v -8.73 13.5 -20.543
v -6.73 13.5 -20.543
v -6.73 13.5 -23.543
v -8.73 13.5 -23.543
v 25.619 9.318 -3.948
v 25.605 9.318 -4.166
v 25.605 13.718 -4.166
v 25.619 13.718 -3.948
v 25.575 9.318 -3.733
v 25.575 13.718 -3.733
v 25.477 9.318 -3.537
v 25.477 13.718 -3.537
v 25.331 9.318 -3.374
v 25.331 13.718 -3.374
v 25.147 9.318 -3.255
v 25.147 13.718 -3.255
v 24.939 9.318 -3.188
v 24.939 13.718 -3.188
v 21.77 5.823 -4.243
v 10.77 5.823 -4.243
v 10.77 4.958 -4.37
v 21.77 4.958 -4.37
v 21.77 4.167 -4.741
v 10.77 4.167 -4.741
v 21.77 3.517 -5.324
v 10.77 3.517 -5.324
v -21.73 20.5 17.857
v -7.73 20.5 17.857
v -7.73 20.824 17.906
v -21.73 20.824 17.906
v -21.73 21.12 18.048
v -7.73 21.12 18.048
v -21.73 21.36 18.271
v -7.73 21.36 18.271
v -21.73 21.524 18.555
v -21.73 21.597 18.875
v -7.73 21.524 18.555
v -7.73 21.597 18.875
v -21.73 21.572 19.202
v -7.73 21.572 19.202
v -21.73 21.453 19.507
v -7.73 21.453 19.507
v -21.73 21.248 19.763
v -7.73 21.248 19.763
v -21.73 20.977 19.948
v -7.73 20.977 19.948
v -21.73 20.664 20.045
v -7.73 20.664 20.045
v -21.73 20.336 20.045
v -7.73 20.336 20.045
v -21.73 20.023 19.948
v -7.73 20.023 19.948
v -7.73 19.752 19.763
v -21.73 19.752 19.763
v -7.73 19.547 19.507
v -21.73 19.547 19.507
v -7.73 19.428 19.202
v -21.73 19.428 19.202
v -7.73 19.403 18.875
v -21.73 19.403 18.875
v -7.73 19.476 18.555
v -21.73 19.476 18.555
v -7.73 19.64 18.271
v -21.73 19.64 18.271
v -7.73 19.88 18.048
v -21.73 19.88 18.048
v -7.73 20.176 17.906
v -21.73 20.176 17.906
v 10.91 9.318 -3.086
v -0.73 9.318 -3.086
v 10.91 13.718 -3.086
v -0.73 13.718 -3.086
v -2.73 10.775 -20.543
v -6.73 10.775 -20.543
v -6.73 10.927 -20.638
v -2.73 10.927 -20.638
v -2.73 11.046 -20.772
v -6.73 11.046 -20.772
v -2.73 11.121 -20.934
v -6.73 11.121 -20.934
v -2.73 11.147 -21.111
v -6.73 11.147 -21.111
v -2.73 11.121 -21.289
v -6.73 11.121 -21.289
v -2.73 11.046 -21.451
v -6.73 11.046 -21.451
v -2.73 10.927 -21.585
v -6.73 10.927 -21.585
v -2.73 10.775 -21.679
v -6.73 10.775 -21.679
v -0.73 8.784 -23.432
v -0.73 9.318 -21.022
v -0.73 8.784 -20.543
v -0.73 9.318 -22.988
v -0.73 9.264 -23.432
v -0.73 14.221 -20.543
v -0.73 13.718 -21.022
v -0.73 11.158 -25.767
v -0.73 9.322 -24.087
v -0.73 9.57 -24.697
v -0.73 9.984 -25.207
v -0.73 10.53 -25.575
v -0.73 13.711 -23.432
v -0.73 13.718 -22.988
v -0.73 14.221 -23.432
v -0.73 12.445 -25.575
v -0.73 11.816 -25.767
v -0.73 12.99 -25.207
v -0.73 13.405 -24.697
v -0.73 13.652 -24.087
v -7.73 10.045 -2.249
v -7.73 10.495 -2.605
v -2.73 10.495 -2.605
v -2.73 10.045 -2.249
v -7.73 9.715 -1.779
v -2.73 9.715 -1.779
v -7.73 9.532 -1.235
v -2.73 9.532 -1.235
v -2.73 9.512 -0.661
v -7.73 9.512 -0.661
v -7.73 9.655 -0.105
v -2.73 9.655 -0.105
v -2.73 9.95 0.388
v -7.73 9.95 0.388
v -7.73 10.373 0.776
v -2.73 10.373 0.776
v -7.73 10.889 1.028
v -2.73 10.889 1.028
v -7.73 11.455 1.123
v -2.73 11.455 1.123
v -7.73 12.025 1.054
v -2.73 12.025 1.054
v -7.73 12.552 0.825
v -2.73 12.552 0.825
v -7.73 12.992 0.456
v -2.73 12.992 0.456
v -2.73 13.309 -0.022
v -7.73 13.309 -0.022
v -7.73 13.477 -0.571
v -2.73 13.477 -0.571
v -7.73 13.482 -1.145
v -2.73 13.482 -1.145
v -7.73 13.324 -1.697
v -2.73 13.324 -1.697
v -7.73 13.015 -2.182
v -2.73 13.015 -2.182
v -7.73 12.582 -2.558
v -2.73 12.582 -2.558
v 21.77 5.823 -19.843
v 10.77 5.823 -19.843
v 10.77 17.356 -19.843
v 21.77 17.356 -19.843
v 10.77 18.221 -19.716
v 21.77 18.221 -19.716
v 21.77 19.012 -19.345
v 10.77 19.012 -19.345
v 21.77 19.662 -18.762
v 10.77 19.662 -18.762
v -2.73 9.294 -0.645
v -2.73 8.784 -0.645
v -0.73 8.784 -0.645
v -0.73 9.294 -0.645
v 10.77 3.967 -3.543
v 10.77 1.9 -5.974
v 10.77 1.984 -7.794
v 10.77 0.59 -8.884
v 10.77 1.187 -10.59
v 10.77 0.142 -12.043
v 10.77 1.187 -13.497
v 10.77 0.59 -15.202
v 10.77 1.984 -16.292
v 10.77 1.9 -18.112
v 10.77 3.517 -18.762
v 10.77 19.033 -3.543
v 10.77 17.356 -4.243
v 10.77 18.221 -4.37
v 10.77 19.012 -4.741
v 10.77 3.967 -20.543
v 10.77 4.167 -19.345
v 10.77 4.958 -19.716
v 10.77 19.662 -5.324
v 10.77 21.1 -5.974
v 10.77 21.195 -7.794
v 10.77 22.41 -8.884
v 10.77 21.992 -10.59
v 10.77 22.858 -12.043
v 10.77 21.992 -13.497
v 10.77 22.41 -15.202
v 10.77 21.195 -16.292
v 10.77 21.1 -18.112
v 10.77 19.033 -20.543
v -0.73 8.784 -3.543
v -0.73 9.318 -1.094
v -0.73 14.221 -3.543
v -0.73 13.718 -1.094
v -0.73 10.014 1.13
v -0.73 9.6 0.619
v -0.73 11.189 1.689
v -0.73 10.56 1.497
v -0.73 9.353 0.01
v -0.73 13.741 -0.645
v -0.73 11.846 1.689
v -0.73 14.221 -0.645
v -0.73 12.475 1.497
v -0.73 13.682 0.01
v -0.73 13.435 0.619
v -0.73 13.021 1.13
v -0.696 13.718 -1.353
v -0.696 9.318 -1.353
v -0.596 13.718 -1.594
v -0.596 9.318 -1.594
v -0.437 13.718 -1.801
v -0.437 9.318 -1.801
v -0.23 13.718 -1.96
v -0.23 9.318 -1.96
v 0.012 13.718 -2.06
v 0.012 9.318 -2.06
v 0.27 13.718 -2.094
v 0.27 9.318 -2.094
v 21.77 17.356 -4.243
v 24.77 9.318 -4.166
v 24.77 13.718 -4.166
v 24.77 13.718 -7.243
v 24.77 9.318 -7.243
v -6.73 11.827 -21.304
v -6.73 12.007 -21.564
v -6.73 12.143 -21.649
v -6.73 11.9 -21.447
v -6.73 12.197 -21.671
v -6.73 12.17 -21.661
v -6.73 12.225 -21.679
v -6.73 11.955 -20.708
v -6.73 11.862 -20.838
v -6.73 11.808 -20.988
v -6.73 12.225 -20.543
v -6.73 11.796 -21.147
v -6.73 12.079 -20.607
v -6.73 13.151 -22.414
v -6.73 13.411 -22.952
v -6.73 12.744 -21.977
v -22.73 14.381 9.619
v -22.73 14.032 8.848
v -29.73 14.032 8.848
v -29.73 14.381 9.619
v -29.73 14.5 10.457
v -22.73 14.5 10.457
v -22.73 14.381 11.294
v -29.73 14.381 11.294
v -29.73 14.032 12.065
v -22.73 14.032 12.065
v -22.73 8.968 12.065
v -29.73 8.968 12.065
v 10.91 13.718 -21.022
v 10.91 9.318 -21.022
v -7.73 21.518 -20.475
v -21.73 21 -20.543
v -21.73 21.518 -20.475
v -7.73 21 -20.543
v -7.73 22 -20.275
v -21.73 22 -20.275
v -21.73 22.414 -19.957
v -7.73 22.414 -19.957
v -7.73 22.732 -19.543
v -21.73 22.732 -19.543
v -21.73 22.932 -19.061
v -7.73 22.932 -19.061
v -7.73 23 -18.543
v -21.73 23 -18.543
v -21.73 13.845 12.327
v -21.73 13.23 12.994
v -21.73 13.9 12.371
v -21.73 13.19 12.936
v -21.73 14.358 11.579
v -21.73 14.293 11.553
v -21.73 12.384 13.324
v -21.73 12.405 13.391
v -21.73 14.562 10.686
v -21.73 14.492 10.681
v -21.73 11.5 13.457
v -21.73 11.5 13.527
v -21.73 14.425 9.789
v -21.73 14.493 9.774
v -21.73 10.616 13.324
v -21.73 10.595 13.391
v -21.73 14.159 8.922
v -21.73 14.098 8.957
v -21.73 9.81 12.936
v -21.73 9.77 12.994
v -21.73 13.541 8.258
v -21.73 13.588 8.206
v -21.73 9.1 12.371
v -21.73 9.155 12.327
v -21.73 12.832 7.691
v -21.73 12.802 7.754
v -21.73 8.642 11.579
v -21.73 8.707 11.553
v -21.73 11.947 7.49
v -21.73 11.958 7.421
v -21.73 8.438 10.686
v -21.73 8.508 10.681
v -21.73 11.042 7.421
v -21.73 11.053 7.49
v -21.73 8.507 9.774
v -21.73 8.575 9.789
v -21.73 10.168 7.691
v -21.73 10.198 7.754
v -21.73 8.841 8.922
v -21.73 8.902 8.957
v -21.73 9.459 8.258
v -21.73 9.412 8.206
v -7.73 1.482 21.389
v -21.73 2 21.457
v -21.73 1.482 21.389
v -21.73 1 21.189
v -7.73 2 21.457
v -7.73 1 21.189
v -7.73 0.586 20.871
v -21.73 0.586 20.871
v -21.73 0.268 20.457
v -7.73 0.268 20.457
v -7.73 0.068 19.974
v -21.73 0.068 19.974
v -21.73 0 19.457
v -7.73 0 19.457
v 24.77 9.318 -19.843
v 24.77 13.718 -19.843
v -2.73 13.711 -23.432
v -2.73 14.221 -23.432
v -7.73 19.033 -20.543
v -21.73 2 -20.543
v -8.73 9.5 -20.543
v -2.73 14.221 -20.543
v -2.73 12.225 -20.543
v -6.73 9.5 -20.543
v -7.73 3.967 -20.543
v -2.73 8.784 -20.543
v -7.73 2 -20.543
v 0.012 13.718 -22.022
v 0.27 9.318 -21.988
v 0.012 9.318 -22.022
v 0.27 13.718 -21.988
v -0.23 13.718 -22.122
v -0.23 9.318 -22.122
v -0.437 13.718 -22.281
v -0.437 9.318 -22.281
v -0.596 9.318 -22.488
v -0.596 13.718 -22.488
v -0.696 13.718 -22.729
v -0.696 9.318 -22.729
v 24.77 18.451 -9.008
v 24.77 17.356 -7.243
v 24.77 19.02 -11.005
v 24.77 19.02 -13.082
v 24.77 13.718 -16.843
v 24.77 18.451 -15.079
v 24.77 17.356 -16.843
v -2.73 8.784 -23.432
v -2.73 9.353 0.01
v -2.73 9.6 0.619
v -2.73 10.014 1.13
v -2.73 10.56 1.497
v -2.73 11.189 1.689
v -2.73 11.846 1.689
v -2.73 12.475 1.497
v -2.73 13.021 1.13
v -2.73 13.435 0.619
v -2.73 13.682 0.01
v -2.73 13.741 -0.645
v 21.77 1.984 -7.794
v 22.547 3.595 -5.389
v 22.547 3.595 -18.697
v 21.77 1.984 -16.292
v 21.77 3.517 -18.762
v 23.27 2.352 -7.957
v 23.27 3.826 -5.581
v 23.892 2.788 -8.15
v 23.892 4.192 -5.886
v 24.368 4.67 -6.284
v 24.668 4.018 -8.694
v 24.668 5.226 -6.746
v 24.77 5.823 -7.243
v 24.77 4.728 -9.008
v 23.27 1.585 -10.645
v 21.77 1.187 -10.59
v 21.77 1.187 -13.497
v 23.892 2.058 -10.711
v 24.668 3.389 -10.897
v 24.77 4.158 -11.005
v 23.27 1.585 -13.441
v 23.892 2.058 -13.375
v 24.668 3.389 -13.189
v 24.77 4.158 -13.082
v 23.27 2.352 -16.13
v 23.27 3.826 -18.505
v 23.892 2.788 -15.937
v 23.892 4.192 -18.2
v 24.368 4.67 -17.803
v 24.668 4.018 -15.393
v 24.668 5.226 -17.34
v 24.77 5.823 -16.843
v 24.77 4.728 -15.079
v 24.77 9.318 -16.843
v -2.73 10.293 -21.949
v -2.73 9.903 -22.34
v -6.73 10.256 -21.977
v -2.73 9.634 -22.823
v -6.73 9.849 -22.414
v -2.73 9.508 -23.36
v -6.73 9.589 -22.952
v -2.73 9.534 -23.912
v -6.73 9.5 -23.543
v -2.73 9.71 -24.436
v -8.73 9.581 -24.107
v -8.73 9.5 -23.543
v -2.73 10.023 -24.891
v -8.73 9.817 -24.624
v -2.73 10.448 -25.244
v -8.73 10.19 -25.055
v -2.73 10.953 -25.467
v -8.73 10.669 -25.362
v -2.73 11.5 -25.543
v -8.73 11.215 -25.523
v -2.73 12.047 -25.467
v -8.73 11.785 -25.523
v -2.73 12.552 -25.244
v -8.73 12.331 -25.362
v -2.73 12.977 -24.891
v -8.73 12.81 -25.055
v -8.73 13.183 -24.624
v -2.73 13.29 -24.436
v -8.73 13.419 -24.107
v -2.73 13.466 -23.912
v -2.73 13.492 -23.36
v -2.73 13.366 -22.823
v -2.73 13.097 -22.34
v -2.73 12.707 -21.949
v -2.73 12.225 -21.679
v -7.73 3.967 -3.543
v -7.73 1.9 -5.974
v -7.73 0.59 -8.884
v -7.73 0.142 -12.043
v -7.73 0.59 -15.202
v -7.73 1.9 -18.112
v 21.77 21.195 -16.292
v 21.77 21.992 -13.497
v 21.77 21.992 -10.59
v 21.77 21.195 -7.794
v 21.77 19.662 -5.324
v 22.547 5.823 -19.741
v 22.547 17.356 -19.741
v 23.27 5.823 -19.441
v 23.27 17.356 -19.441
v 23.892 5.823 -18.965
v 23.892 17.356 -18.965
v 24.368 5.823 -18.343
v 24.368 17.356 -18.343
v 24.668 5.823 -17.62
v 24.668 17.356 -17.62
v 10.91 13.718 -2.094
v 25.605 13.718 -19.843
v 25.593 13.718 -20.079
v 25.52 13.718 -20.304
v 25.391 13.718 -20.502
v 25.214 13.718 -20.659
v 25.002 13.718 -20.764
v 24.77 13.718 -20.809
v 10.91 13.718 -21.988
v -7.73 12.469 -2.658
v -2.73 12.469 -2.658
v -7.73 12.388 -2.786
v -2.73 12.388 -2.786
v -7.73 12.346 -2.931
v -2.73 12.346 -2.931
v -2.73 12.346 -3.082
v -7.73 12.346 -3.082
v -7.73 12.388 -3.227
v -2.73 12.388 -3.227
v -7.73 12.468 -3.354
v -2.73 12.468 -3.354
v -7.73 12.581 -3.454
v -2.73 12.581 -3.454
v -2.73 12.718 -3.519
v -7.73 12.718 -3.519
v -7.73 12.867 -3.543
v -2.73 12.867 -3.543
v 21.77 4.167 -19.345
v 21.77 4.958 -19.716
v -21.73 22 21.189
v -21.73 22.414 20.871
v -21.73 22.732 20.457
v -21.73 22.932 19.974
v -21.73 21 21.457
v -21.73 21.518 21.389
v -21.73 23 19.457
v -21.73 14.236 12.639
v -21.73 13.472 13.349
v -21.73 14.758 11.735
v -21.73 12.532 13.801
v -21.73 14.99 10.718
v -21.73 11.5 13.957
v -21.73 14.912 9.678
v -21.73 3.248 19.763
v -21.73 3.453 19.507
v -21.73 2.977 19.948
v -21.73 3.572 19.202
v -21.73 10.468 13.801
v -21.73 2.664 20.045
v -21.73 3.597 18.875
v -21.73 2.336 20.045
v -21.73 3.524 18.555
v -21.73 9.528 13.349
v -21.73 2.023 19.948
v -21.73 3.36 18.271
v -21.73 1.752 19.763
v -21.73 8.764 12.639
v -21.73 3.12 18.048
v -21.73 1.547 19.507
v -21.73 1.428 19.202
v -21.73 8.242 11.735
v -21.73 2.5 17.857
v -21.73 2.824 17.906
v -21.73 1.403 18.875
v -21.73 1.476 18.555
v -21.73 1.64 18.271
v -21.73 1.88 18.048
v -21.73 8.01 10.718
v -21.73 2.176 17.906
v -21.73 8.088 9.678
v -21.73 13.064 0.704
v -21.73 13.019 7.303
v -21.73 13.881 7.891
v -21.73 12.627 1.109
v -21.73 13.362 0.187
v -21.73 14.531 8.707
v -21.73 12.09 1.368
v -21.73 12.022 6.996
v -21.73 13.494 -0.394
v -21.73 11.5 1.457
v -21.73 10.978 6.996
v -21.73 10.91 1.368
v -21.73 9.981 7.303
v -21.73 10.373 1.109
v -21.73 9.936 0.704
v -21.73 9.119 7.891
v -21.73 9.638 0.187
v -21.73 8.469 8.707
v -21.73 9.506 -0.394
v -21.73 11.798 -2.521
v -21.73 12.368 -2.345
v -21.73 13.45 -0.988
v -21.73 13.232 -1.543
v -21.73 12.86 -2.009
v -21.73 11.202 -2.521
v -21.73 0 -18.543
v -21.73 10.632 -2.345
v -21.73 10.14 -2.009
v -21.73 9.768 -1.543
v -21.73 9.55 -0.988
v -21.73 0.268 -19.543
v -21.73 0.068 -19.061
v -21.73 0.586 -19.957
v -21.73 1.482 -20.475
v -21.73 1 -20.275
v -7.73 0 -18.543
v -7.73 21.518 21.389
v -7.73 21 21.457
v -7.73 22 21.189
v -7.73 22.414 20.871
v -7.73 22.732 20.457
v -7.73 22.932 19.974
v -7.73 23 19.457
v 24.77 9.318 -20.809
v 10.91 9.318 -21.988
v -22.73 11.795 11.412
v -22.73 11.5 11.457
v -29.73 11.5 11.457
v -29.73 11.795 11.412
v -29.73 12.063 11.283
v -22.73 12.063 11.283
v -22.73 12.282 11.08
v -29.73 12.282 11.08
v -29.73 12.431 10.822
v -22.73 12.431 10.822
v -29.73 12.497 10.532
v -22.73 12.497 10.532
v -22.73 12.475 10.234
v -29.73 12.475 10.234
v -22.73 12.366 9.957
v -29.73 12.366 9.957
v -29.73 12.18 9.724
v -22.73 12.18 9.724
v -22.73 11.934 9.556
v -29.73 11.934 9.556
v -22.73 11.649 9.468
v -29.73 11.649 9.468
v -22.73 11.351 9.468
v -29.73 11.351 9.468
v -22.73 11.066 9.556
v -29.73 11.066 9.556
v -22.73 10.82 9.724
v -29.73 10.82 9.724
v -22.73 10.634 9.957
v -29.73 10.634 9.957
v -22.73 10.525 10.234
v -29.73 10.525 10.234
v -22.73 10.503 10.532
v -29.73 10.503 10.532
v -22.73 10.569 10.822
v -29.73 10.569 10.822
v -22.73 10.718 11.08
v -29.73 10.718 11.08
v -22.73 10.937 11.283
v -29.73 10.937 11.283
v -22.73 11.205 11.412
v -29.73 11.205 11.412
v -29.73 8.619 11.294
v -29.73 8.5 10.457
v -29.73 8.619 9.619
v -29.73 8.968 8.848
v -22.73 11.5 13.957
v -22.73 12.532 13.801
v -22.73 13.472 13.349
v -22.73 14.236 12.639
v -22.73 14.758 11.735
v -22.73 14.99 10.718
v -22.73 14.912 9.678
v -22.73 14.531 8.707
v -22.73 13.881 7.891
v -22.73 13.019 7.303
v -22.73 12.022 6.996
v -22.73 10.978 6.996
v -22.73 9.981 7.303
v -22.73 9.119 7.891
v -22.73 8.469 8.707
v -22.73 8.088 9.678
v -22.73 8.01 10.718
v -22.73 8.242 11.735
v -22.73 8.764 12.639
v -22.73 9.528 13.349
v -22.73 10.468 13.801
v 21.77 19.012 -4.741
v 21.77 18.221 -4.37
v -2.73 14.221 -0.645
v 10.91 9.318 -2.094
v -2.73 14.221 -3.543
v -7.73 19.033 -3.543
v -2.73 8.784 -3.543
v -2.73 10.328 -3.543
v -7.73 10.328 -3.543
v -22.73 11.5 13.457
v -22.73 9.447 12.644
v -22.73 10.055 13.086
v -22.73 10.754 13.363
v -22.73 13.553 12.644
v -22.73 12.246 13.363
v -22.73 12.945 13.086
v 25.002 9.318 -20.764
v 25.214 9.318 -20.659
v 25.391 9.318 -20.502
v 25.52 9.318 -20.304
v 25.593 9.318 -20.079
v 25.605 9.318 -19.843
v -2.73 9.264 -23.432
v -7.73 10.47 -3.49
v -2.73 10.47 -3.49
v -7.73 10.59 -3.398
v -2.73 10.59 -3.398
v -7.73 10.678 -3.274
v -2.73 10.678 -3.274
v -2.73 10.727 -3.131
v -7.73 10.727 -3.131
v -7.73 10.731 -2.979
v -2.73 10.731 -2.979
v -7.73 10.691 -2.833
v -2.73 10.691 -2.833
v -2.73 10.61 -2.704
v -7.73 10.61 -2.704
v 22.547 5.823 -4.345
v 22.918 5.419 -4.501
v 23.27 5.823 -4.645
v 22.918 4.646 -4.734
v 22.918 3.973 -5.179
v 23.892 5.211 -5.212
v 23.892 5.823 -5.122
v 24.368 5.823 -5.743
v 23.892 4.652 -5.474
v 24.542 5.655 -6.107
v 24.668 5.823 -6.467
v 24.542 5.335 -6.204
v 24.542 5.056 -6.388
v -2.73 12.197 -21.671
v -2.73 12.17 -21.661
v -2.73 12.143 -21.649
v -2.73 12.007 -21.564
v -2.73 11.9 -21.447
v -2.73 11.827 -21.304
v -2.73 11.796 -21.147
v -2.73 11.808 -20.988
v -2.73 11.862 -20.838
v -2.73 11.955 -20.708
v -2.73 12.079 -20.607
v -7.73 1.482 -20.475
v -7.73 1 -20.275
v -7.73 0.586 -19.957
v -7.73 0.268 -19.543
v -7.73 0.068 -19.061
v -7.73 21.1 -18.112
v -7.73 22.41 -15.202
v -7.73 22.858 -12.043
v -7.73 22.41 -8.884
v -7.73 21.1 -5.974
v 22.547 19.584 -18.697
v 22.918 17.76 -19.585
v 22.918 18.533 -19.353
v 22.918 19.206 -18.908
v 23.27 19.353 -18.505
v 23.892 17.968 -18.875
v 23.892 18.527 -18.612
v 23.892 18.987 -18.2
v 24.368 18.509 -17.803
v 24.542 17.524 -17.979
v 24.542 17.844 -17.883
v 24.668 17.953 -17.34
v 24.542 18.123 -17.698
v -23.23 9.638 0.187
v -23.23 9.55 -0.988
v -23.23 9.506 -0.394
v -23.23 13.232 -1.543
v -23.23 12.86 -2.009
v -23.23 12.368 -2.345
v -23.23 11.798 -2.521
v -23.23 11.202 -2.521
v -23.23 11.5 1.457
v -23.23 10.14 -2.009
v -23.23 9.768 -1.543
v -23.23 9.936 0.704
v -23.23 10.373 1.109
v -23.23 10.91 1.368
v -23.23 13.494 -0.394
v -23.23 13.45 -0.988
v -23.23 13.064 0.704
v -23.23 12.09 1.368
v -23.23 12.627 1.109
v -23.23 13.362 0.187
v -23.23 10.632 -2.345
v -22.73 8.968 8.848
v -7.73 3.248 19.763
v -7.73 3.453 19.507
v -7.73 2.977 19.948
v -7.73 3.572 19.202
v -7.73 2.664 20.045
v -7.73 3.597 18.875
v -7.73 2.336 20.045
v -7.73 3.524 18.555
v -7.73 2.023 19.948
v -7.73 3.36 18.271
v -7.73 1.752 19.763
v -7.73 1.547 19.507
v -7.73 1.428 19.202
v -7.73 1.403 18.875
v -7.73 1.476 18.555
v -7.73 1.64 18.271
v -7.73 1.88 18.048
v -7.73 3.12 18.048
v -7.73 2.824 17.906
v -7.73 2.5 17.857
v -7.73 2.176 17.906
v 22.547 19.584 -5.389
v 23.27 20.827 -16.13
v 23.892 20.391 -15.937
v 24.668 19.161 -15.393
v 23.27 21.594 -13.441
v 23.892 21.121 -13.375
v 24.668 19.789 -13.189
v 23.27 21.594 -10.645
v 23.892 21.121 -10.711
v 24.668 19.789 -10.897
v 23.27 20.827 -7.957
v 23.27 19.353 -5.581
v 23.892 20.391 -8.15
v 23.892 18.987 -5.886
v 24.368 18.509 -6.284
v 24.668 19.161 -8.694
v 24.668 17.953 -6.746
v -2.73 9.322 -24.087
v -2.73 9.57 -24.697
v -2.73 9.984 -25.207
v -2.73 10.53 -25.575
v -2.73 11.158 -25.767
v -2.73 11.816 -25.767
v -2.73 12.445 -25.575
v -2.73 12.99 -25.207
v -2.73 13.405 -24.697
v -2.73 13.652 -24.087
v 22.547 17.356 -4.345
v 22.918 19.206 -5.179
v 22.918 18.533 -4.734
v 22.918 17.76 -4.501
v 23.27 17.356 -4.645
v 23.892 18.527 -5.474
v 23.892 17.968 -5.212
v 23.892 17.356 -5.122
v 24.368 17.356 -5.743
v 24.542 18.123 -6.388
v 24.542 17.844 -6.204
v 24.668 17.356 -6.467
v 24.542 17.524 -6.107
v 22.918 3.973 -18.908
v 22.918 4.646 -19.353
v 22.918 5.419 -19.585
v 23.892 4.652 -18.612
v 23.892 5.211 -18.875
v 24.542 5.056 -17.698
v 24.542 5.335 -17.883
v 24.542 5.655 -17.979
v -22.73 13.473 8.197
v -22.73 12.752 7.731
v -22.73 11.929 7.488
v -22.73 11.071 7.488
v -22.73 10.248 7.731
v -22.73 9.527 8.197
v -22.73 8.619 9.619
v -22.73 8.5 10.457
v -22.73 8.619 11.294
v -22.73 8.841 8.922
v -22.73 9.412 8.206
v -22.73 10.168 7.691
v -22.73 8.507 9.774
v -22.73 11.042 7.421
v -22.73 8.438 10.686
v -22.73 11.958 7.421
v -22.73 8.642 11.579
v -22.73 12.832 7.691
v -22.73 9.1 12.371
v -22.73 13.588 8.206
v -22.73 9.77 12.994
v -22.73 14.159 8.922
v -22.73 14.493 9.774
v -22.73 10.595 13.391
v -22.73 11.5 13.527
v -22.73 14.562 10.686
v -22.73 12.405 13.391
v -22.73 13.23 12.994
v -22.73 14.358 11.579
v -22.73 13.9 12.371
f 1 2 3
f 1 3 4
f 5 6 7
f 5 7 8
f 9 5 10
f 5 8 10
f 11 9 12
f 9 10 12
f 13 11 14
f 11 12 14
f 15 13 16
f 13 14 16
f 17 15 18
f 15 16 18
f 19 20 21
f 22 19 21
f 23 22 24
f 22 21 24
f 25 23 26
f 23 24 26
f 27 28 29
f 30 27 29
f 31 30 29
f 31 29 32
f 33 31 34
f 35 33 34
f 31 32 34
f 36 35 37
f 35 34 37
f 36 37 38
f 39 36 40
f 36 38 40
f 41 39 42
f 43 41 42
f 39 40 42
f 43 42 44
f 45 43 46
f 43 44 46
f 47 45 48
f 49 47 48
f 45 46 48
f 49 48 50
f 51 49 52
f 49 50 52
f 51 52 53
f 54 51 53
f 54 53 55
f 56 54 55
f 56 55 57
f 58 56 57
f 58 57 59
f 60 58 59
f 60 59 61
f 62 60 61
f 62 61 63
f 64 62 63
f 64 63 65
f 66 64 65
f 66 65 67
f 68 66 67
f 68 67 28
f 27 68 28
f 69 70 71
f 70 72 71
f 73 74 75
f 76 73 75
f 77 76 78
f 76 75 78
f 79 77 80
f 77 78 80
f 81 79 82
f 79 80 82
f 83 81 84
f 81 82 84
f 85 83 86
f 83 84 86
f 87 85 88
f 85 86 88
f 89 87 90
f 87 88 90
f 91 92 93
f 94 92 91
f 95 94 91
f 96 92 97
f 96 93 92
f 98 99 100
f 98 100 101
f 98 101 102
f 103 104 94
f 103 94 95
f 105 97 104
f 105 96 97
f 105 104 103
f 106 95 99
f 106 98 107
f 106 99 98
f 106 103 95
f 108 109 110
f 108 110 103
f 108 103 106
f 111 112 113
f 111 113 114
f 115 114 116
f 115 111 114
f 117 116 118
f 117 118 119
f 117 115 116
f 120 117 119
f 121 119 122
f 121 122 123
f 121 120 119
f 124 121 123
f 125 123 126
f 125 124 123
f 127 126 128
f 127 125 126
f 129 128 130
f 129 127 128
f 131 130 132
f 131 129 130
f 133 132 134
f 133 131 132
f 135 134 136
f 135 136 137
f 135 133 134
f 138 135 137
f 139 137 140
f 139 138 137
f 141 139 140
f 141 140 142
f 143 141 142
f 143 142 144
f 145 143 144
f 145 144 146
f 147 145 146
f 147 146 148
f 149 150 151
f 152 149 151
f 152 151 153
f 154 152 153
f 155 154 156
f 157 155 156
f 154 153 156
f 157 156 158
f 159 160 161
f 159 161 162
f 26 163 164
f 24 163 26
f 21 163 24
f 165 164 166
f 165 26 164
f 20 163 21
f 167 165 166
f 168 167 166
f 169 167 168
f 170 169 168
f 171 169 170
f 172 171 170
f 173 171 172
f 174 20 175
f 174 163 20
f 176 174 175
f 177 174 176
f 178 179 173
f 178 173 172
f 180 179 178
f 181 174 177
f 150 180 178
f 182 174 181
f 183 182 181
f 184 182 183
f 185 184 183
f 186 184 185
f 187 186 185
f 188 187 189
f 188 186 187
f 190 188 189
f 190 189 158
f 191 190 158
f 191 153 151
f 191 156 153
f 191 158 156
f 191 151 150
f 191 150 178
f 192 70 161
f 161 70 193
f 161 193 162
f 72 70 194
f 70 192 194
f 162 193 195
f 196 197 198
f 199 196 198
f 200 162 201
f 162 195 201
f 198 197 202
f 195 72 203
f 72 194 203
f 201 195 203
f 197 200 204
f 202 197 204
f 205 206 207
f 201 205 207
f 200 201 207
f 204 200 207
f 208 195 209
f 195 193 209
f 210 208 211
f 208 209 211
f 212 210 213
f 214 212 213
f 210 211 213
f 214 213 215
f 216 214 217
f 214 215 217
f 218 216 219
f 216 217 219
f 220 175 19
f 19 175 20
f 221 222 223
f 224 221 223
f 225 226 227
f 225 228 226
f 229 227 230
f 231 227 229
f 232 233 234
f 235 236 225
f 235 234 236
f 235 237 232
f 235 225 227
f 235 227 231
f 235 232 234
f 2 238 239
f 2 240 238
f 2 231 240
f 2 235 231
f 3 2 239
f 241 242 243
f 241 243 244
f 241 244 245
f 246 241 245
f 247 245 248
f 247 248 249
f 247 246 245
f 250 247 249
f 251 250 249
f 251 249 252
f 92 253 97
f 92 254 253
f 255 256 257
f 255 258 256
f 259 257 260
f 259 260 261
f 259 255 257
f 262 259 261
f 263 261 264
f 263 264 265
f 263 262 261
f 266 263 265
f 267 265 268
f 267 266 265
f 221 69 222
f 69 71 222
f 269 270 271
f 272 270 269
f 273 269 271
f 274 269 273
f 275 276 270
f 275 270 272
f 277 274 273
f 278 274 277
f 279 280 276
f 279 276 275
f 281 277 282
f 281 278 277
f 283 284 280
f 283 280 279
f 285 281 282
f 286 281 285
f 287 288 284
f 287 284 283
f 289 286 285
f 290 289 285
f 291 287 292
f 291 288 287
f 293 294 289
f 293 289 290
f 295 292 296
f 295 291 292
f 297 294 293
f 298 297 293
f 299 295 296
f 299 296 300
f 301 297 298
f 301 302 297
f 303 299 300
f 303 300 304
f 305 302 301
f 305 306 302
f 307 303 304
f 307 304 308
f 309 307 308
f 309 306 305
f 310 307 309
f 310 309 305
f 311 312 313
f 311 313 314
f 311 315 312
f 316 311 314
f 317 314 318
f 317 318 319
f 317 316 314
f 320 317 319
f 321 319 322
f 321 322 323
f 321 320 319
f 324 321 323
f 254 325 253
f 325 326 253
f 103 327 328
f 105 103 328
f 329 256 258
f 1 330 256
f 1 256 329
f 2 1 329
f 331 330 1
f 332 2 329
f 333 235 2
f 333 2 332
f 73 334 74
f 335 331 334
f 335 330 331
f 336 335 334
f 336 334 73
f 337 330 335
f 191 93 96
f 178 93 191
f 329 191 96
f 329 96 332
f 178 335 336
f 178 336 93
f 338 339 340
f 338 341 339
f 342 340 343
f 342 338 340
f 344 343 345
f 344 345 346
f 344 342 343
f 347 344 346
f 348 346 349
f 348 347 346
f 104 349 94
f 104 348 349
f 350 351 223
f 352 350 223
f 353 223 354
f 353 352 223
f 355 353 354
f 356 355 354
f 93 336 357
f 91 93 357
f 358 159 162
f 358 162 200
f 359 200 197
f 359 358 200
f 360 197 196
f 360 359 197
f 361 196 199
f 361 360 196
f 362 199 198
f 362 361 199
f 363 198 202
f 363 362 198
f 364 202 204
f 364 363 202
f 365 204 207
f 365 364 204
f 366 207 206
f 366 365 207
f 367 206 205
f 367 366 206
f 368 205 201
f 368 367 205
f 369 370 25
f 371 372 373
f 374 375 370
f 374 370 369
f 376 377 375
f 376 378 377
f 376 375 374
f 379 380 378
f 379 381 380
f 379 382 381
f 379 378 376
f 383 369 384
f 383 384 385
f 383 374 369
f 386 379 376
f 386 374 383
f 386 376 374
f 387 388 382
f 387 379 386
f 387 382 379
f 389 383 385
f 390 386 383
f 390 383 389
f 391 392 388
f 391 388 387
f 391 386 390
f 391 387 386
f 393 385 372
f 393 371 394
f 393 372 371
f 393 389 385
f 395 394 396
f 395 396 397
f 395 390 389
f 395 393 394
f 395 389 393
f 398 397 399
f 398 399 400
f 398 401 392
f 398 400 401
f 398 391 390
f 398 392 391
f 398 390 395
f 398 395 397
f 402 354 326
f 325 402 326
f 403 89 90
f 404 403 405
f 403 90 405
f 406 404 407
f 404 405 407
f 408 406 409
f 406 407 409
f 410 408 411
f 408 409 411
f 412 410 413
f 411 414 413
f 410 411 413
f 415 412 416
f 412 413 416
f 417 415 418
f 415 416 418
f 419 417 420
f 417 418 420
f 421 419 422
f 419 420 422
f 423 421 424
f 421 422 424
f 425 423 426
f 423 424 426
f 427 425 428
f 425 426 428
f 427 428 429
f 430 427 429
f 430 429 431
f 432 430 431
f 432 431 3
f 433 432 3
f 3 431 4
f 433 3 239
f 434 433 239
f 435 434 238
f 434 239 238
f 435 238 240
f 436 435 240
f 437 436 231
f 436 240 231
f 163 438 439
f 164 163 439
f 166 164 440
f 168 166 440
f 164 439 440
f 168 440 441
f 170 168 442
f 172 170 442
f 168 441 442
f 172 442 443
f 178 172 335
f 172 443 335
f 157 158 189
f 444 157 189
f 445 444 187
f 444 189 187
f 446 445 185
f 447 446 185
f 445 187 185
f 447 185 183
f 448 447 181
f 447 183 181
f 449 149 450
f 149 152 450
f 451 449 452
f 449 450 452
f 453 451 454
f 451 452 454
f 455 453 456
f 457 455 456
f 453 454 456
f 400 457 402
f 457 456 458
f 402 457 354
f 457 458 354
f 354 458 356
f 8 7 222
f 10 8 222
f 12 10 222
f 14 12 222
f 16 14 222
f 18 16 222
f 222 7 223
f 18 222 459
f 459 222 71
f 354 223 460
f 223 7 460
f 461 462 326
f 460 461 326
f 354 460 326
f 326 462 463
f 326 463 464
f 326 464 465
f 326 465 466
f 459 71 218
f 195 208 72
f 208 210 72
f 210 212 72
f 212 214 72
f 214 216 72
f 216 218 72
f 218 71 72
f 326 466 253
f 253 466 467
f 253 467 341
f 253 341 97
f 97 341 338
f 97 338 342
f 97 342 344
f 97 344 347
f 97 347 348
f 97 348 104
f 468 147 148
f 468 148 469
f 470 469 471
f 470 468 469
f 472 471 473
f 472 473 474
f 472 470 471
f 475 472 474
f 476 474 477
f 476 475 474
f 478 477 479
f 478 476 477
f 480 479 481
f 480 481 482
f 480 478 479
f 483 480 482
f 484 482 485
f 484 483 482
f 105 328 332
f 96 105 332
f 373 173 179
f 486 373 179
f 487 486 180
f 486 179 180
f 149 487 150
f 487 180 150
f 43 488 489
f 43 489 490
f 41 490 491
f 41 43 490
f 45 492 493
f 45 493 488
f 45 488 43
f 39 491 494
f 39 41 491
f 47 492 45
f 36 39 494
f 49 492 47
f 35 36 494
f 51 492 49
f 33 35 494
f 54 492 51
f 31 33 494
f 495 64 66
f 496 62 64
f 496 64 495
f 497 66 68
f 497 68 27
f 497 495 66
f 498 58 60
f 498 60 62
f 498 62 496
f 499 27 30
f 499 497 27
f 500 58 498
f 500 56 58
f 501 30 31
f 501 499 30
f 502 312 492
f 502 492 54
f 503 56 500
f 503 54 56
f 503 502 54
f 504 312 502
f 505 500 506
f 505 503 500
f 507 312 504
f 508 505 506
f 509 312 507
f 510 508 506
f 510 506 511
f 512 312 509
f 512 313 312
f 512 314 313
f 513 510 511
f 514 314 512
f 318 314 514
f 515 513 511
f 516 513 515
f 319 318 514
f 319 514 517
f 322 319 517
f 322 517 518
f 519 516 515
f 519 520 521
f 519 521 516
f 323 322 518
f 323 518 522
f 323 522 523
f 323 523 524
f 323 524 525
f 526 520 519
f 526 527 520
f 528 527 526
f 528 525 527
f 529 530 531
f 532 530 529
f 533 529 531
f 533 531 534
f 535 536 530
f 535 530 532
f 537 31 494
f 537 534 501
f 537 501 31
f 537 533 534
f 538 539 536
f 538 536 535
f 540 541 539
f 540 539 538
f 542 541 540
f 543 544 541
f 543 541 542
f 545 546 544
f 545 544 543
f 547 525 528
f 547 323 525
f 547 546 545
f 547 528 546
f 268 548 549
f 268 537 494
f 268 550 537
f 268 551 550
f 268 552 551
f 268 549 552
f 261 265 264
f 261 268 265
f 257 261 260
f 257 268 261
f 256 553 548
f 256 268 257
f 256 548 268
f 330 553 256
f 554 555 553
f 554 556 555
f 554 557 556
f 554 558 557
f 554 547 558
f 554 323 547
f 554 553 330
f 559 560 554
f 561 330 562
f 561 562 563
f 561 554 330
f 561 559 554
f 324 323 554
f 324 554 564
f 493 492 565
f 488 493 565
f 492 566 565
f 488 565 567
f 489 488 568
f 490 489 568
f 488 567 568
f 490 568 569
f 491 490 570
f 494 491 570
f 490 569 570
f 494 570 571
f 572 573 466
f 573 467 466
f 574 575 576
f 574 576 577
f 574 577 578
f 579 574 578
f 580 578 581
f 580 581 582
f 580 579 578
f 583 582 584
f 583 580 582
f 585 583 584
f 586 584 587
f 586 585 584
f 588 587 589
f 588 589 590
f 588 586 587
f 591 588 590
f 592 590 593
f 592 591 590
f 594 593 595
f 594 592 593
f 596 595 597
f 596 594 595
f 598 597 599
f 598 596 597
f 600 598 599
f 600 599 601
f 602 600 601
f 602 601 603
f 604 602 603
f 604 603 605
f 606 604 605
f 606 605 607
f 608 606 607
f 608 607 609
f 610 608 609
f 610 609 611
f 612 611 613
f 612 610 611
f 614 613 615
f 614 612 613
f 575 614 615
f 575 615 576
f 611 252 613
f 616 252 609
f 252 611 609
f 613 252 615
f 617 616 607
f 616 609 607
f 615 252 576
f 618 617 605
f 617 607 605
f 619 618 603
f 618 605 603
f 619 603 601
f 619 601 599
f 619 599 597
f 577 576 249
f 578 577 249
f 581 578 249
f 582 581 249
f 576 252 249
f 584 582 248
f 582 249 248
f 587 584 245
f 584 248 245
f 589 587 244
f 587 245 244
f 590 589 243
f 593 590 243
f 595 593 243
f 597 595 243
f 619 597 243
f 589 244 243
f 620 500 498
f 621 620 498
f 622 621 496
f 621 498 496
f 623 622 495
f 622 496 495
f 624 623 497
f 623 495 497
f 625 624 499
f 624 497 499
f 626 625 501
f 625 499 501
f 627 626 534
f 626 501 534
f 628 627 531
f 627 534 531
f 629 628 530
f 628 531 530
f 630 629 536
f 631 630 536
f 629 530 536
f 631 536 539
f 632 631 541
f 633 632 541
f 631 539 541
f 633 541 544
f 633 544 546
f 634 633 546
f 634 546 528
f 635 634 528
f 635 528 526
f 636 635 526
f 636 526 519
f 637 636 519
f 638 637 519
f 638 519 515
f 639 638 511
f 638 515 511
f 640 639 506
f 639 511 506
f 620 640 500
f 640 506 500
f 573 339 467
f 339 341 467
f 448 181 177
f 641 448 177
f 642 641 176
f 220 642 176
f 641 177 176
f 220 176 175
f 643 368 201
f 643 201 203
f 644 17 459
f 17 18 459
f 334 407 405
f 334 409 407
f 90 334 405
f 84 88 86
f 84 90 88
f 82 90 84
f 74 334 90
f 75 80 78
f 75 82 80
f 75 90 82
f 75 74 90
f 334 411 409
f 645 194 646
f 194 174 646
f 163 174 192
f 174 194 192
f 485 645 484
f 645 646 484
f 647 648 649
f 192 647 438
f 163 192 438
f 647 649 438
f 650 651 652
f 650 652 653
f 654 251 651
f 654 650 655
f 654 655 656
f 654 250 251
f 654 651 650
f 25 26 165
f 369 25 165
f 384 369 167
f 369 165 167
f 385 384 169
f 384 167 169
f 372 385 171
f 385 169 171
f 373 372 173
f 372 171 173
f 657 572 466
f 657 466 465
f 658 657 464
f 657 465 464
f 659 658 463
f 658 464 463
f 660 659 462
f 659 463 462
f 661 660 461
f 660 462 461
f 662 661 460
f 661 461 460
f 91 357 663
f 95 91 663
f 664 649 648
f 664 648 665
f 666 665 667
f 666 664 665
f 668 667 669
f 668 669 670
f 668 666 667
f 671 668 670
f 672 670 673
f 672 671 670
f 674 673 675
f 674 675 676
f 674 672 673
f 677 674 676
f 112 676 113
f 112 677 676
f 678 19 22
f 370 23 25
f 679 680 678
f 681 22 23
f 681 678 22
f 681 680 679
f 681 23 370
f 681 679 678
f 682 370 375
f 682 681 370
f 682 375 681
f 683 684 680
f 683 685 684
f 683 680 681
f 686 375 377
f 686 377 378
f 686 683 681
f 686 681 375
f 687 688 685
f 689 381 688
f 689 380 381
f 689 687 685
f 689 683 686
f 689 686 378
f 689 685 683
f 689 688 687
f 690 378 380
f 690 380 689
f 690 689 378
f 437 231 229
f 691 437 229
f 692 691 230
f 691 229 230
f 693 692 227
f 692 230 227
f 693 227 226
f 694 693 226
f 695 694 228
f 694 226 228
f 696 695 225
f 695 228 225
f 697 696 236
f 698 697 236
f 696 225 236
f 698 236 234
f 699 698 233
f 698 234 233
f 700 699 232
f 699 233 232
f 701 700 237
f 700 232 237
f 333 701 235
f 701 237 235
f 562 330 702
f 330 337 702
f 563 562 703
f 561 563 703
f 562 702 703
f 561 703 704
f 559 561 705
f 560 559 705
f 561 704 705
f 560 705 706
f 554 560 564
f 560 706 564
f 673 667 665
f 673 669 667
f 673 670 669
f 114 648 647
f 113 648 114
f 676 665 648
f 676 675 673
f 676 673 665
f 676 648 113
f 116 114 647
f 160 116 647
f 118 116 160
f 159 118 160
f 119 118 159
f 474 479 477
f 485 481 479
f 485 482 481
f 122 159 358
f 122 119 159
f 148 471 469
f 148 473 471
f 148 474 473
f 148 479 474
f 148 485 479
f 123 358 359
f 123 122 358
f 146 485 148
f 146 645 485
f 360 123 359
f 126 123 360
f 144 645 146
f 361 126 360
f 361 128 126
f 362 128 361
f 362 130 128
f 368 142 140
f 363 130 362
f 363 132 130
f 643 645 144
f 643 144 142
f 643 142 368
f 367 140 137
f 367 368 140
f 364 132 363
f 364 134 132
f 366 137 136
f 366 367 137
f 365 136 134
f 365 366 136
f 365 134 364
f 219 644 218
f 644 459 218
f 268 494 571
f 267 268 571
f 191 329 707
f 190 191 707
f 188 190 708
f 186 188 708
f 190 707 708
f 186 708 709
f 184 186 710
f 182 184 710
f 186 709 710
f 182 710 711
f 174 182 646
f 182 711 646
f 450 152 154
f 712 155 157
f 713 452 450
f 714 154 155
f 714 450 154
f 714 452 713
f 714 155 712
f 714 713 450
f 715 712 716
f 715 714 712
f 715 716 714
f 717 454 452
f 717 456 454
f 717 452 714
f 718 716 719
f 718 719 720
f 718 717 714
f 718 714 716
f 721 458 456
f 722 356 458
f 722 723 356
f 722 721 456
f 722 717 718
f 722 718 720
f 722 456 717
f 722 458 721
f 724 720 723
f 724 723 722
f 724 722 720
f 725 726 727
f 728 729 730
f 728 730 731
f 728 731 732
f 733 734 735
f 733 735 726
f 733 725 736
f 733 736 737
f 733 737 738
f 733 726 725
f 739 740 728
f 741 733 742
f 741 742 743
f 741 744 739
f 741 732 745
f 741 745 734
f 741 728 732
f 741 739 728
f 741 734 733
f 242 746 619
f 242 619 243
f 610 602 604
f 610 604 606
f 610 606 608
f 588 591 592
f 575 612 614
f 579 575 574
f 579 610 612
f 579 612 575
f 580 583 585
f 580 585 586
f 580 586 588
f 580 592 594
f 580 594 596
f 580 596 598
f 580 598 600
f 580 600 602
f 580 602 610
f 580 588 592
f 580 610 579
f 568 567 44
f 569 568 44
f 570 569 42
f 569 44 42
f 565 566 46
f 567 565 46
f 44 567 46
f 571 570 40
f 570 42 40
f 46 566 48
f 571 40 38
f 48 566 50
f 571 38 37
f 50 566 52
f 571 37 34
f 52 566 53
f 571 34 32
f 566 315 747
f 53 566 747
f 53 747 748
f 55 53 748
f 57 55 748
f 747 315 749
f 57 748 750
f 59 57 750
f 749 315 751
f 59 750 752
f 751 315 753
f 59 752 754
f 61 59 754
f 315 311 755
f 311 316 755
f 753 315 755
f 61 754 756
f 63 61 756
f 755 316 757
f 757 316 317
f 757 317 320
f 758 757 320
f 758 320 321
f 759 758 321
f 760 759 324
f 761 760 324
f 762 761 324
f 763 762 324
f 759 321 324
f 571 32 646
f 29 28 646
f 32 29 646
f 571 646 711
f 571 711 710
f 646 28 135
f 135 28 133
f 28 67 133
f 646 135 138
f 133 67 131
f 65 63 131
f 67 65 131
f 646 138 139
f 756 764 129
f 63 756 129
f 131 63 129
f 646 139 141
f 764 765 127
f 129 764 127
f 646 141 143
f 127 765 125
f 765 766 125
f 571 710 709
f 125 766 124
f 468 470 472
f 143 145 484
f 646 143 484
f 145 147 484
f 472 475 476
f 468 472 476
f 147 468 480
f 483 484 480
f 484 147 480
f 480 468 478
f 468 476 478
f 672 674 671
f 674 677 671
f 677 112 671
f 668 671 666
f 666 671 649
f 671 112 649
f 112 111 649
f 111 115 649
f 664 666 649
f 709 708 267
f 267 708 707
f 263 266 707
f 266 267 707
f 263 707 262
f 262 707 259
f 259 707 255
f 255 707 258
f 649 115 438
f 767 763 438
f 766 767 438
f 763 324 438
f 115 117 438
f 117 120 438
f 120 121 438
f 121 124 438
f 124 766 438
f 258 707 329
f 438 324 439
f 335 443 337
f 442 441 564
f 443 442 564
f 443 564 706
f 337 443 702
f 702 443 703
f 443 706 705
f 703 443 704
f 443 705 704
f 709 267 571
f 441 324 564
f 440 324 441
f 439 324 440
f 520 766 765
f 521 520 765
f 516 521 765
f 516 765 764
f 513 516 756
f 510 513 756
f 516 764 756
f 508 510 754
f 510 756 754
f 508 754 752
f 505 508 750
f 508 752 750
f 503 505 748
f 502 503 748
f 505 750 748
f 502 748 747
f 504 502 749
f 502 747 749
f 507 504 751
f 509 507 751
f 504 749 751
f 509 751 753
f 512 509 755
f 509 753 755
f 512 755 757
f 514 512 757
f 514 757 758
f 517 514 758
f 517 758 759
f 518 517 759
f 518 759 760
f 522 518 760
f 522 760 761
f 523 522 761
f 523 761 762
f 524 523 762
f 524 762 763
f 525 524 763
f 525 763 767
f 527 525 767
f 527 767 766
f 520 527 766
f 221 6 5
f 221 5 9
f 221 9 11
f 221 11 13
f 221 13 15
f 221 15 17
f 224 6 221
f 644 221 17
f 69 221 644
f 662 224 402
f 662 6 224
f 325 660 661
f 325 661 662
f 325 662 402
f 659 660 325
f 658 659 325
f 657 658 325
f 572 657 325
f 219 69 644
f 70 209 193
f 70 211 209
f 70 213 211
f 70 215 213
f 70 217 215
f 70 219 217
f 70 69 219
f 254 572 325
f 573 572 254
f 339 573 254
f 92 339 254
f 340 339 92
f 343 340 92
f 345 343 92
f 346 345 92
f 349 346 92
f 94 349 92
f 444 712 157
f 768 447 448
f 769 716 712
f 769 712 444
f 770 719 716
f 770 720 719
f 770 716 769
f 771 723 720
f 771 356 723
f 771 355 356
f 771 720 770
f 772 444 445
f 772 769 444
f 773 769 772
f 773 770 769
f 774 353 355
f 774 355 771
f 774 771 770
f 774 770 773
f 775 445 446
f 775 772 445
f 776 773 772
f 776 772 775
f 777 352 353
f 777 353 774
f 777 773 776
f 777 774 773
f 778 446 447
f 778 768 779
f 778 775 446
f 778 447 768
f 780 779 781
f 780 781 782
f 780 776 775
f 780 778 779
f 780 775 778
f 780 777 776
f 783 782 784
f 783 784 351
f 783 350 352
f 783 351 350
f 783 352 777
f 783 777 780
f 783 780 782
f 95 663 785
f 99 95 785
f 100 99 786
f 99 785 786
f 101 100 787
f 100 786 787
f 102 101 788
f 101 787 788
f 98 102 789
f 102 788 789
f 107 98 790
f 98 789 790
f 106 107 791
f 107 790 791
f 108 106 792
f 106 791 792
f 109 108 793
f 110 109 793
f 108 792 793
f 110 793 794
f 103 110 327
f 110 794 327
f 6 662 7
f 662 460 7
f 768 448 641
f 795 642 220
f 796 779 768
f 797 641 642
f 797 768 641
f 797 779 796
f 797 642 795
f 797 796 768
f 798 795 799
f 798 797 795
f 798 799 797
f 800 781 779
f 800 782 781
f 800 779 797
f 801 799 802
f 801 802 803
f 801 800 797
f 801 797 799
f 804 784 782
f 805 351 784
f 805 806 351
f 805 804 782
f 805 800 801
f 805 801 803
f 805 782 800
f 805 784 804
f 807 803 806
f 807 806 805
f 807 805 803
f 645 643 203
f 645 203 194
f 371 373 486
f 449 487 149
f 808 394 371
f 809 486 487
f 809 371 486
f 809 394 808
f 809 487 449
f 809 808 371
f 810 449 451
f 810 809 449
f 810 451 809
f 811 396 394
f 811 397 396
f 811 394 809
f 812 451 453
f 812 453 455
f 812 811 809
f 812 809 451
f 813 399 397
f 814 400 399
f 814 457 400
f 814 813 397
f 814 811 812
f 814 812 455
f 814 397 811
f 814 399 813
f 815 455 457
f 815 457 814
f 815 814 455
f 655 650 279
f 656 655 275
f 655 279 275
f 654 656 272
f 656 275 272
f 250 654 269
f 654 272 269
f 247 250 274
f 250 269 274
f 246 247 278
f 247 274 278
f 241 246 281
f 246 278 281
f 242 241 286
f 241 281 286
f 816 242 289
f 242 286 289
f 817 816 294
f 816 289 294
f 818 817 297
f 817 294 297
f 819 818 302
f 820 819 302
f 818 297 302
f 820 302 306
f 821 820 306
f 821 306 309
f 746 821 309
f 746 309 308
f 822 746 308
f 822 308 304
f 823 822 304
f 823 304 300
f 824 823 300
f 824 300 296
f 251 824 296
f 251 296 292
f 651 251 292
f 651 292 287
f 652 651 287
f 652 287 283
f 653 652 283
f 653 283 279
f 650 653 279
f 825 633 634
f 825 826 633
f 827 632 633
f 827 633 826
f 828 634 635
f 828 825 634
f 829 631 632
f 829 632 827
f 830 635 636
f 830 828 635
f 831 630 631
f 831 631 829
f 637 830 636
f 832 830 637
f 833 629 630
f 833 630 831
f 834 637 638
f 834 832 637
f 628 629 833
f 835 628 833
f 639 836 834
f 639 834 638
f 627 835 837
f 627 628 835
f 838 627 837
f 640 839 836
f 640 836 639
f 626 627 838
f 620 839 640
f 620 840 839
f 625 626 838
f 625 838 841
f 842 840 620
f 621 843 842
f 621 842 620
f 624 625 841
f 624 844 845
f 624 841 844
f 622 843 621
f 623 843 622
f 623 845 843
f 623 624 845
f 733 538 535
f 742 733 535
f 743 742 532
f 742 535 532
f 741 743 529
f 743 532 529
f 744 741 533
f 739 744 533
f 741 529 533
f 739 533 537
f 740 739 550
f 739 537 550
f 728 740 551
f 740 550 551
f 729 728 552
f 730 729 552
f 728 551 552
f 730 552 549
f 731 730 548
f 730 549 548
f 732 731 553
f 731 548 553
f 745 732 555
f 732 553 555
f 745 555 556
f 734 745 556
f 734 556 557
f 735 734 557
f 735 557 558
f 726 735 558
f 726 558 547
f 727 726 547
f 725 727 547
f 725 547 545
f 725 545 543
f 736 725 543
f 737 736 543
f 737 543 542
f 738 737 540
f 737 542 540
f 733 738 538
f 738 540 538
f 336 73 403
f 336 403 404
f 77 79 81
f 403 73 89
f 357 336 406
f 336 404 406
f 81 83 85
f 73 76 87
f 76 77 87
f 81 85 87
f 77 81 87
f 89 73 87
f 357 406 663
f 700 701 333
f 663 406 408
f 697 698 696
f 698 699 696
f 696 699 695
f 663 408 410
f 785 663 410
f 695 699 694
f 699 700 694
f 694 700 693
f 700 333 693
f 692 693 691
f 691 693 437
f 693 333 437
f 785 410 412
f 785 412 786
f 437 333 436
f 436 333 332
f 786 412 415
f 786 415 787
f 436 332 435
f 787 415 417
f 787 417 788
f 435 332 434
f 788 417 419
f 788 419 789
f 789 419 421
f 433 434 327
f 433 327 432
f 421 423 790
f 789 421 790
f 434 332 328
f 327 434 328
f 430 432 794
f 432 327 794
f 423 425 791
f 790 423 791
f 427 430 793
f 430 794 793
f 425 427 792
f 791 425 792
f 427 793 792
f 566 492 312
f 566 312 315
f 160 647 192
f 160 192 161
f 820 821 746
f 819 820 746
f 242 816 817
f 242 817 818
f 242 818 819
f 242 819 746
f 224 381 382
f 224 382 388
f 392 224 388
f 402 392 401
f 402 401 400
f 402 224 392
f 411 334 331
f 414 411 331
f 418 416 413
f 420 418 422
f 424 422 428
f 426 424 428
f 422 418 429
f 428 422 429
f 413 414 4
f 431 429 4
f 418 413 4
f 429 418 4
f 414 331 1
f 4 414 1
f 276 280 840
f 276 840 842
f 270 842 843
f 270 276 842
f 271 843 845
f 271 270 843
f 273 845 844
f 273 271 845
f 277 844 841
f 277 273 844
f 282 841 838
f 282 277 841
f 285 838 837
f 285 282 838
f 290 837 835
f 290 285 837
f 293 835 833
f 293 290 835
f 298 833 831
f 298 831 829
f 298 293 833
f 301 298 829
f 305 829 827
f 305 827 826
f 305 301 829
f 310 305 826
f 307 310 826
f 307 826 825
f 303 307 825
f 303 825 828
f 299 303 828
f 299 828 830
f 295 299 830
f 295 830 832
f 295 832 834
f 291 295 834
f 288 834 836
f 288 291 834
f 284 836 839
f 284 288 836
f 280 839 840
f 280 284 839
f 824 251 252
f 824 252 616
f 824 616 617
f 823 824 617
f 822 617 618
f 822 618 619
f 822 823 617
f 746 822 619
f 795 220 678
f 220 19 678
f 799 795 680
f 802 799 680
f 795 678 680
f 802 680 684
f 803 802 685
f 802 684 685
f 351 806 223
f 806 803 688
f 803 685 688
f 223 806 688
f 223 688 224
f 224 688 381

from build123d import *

# Parameters (mm, degrees)
SKETCH1_W                = 14
SKETCH1_H                = 42
MAIN_BODY_DEPTH          = 23
FILLET1_R                = 2
MOTOR_HOLDER_DEPTH       = 18.5
BOSS_EXTRUDE3_DEPTH      = 5
SKETCH4_R                = 1.1
NUT_HOLES_DEPTH          = 15
SKETCH5_W                = 2
SKETCH5_H                = 4
BOSS_EXTRUDE4_DEPTH      = 5
BOSS_EXTRUDE5_DEPTH      = 4
CUT_EXTRUDE2_DEPTH       = 2
BOSS_EXTRUDE6_DEPTH      = 14
BOSS_EXTRUDE7_DEPTH      = 2
FILLET2_R                = 3
BOSS_EXTRUDE8_DEPTH      = 2.2
BOSS_EXTRUDE8_DEPTH_BACK = 2.2
FILLET3_R                = 1
SKETCH12_R               = 3.5
SKETCH12_R_2             = 3.070336519
BOSS_EXTRUDE9_DEPTH      = 1
SKETCH14_R               = 3
BOSS_EXTRUDE10_DEPTH     = 1
SKETCH15_R               = 1
SHAFT_DEPTH              = 7
SKETCH16_R               = 2
BOSS_EXTRUDE12_DEPTH     = 1.5


with BuildPart() as part:
    # Sketch1 → Main Body (new body)
    with BuildSketch(Plane(origin=(0, 0, 0), x_dir=(1, 0, 0), z_dir=(0, 1, 0))):
        with Locations((-14.72963025, -0.456790856)):
            Rectangle(SKETCH1_W, SKETCH1_H)
    extrude(amount=MAIN_BODY_DEPTH)

    # Fillet1
    fillet1_edges = [part.edges().sort_by_distance(p)[0] for p in [
        (-14.72963025, 23, -20.543209144),
        (-14.72963025, 0, -20.543209144),
        (-14.72963025, 0, 21.456790856),
        (-14.72963025, 23, 21.456790856),
    ]]
    fillet(fillet1_edges, radius=FILLET1_R)

    # Sketch2 → Motor Holder (add)
    with BuildSketch(Plane(origin=(-7.72963025, 0, 0), x_dir=(0, 0, -1), z_dir=(1, 0, 0))):
        with BuildLine():
            Line((3.543209144, 19.033283793), (3.543209144, 3.966716207))
            ThreePointArc((3.543209144, 3.966716207), (12.043209144, 0.142167253), (20.543209144, 3.966716207))
            Line((20.543209144, 3.966716207), (20.543209144, 19.033283793))
            ThreePointArc((20.543209144, 19.033283793), (12.043209144, 22.857832747), (3.543209144, 19.033283793))
        make_face()
    extrude(amount=MOTOR_HOLDER_DEPTH)

    # Sketch3 → Boss-Extrude3 (add)
    with BuildSketch(Plane(origin=(-7.72963025, 0, 0), x_dir=(0, 0, -1), z_dir=(1, 0, 0))):
        with BuildLine():
            Line((3.543209144, 12.866872794), (3.543209144, 10.327683852))
            ThreePointArc((3.543209144, 10.327683852), (3.130583543, 10.726570697), (2.605351044, 10.495266949))
            ThreePointArc((2.605351044, 10.495266949), (-1.12344994, 11.454900344), (2.558290761, 12.581682682))
            ThreePointArc((2.558290761, 12.581682682), (3.155784465, 12.361535772), (3.543209144, 12.866872794))
        make_face()
    extrude(amount=BOSS_EXTRUDE3_DEPTH)

    # Sketch4 → Nut Holes (cut)
    with BuildSketch(Plane(origin=(-7.72963025, 0, 0), x_dir=(0, 0, -1), z_dir=(1, 0, 0))):
        with Locations((-18.956790856, 20.5)):
            Circle(SKETCH4_R)
        with Locations((-18.956790856, 2.5)):
            Circle(SKETCH4_R)
    extrude(amount=-NUT_HOLES_DEPTH, mode=Mode.SUBTRACT)

    # Sketch5 → Boss-Extrude4 (add)
    with BuildSketch(Plane(origin=(0, 0, -20.543209144), x_dir=(-1, 0, 0), z_dir=(0, 0, -1))):
        with Locations((7.72963025, 11.5)):
            Rectangle(SKETCH5_W, SKETCH5_H)
    extrude(amount=BOSS_EXTRUDE4_DEPTH)

    # Sketch6 → Boss-Extrude5 (add)
    with BuildSketch(Plane(origin=(-6.72963025, 0, 0), x_dir=(0, 0, -1), z_dir=(1, 0, 0))):
        with BuildLine():
            ThreePointArc((21.679339079, 10.774749435), (23.912167048, 9.534327071), (25.543209144, 11.5))
            ThreePointArc((25.543209144, 11.5), (23.912167048, 13.465672929), (21.679339079, 12.225250565))
            ThreePointArc((21.679339079, 12.225250565), (21.665841795, 12.183376686), (21.649262587, 12.142624651))
            ThreePointArc((21.649262587, 12.142624651), (21.543692429, 11.456035136), (21.679339079, 10.774749435))
        make_face()
        with BuildLine():
            ThreePointArc((20.543209144, 10.774749435), (21.111274111, 11.147288257), (21.679339079, 10.774749435))
            ThreePointArc((21.679339079, 10.774749435), (21.543692429, 11.456035136), (21.649262587, 12.142624651))
            ThreePointArc((21.649262587, 12.142624651), (21.067309248, 11.796717861), (20.543209144, 12.225250565))
            Line((20.543209144, 12.225250565), (20.543209144, 10.774749435))
        make_face()
    extrude(amount=BOSS_EXTRUDE5_DEPTH)

    # Sketch7 → Cut-Extrude2 (cut)
    with BuildSketch(Plane(origin=(-6.72963025, 0, 0), x_dir=(0, 0, -1), z_dir=(1, 0, 0))):
        with BuildLine():
            Line((23.543209144, 13.5), (23.543209144, 13.967200788))
            Line((23.543209144, 13.967200788), (25.760178749, 13.967200788))
            Line((25.760178749, 13.967200788), (25.760178749, 8.970470958))
            Line((25.760178749, 8.970470958), (23.543209144, 8.970470958))
            Line((23.543209144, 8.970470958), (23.543209144, 9.5))
            ThreePointArc((23.543209144, 9.5), (25.543209144, 11.5), (23.543209144, 13.5))
        make_face()
    extrude(amount=-CUT_EXTRUDE2_DEPTH, mode=Mode.SUBTRACT)

    # Sketch8 → Boss-Extrude6 (add)
    with BuildSketch(Plane(origin=(10.77036975, 0, 0), x_dir=(0, 0, -1), z_dir=(1, 0, 0))):
        with BuildLine():
            Line((4.243209144, 17.35646316), (4.243209144, 5.822511997))
            ThreePointArc((4.243209144, 5.822511997), (4.526819665, 4.549237399), (5.324027945, 3.516705516))
            ThreePointArc((5.324027945, 3.516705516), (12.043209144, 1.086287771), (18.762390342, 3.516705516))
            ThreePointArc((18.762390342, 3.516705516), (19.559598622, 4.549237399), (19.843209144, 5.822511997))
            Line((19.843209144, 5.822511997), (19.843209144, 17.35646316))
            ThreePointArc((19.843209144, 17.35646316), (19.559598622, 18.629737758), (18.762390342, 19.66226964))
            ThreePointArc((18.762390342, 19.66226964), (12.043209144, 22.092687386), (5.324027945, 19.66226964))
            ThreePointArc((5.324027945, 19.66226964), (4.526819665, 18.629737758), (4.243209144, 17.35646316))
        make_face()
    extrude(amount=BOSS_EXTRUDE6_DEPTH)

    # Sketch9 → Boss-Extrude7 (add)
    with BuildSketch(Plane(origin=(-2.72963025, 0, 0), x_dir=(0, 0, -1), z_dir=(1, 0, 0))):
        with BuildLine():
            Line((20.534219475, 8.784213792), (23.432322776, 8.784213792))
            Line((23.432322776, 8.784213792), (23.432322776, 9.263820028))
            ThreePointArc((23.432322776, 9.263820028), (25.790969288, 11.48725138), (23.432322776, 13.710682731))
            Line((23.432322776, 13.710682731), (23.432322776, 14.220655847))
            Line((23.432322776, 14.220655847), (20.534219475, 14.220655847))
            Line((20.534219475, 14.220655847), (20.534219475, 8.784213792))
        make_face()
        with BuildLine():
            Line((3.543209144, 8.784213792), (0.645105842, 8.784213792))
            Line((0.645105842, 8.784213792), (0.645105842, 9.294186907))
            ThreePointArc((0.645105842, 9.294186907), (-1.71354067, 11.517618258), (0.645105842, 13.74104961))
            Line((0.645105842, 13.74104961), (0.645105842, 14.220655847))
            Line((0.645105842, 14.220655847), (3.543209144, 14.220655847))
            Line((3.543209144, 14.220655847), (3.543209144, 8.784213792))
        make_face()
    extrude(amount=BOSS_EXTRUDE7_DEPTH)

    # Fillet2
    fillet2_edges = [part.edges().sort_by_distance(p)[0] for p in [
        (24.77036975, 18.629737758, -4.526819665),
        (24.77036975, 11.589487578, -4.243209144),
        (24.77036975, 4.549237399, -4.526819665),
        (24.77036975, 1.086287771, -12.043209144),
        (24.77036975, 4.549237399, -19.559598622),
        (24.77036975, 11.589487578, -19.843209144),
        (24.77036975, 18.629737758, -19.559598622),
        (24.77036975, 22.092687386, -12.043209144),
    ]]
    fillet(fillet2_edges, radius=FILLET2_R)

    # Sketch10 → Boss-Extrude8 (add, two sides)
    with BuildSketch(Plane(origin=(0, 11.5176, 0), x_dir=(1, 0, 0), z_dir=(0, 1, 0))) as boss_extrude8_sk:
        with BuildLine():
            Line((-0.72963025, 21.98776596), (10.910253109, 21.98776596))
            Line((10.910253109, 21.98776596), (24.77036975, 20.809448862))
            ThreePointArc((24.77036975, 20.809448862), (25.391050954, 20.50205534), (25.604727399, 19.843209144))
            Line((25.604727399, 19.843209144), (25.604727399, 4.166099851))
            ThreePointArc((25.604727399, 4.166099851), (25.476560723, 3.537376336), (24.938530753, 3.187742664))
            Line((24.938530753, 3.187742664), (10.910253109, 2.094157493))
            Line((10.910253109, 2.094157493), (-0.72963025, 2.094157493))
            Line((-0.72963025, 2.094157493), (-0.72963025, 3.0856238))
            Line((-0.72963025, 3.0856238), (10.910253109, 3.0856238))
            Line((10.910253109, 3.0856238), (24.77036975, 4.166099851))
            Line((24.77036975, 4.166099851), (24.77036975, 19.843209144))
            Line((24.77036975, 19.843209144), (10.910253109, 21.021526241))
            Line((10.910253109, 21.021526241), (-0.72963025, 21.021526241))
            Line((-0.72963025, 21.021526241), (-0.72963025, 21.98776596))
        make_face()
    extrude(amount=BOSS_EXTRUDE8_DEPTH)
    extrude(boss_extrude8_sk.sketch, amount=-BOSS_EXTRUDE8_DEPTH_BACK)

    # Fillet3
    fillet3_edges = [part.edges().sort_by_distance(p)[0] for p in [
        (-0.72963025, 11.5176, -21.98776596),
        (-0.72963025, 11.5176, -2.094157493),
    ]]
    fillet(fillet3_edges, radius=FILLET3_R)

    # Sketch12 → Boss-Extrude9 (add)
    with BuildSketch(Plane.ZY.offset(21.72963025)):
        with Locations((10.456790856, 11.5)):
            Circle(SKETCH12_R)
        with Locations((10.456790856, 11.5)):
            Circle(SKETCH12_R_2, mode=Mode.SUBTRACT)
    extrude(amount=BOSS_EXTRUDE9_DEPTH)

    # Sketch14 → Boss-Extrude10 (add)
    with BuildSketch(Plane.ZY.offset(21.72963025)):
        with Locations((10.456790856, 11.5)):
            Circle(SKETCH14_R)
    extrude(amount=BOSS_EXTRUDE10_DEPTH)

    # Sketch15 → Shaft (add)
    with BuildSketch(Plane.ZY.offset(22.72963025)):
        with BuildLine():
            Line((8.848293419, 8.967661951), (8.848293419, 14.032338049))
            ThreePointArc((8.848293419, 14.032338049), (10.456790856, 14.5), (12.065288294, 14.032338049))
            Line((12.065288294, 14.032338049), (12.065288294, 8.967661951))
            ThreePointArc((12.065288294, 8.967661951), (10.456790856, 8.5), (8.848293419, 8.967661951))
        make_face()
        with Locations((10.456790856, 11.5)):
            Circle(SKETCH15_R, mode=Mode.SUBTRACT)
    extrude(amount=SHAFT_DEPTH)

    # Sketch16 → Boss-Extrude12 (add)
    with BuildSketch(Plane.ZY.offset(21.72963025)):
        with Locations((-0.543209144, 11.5)):
            Circle(SKETCH16_R)
    extrude(amount=BOSS_EXTRUDE12_DEPTH)


solid = part.part
